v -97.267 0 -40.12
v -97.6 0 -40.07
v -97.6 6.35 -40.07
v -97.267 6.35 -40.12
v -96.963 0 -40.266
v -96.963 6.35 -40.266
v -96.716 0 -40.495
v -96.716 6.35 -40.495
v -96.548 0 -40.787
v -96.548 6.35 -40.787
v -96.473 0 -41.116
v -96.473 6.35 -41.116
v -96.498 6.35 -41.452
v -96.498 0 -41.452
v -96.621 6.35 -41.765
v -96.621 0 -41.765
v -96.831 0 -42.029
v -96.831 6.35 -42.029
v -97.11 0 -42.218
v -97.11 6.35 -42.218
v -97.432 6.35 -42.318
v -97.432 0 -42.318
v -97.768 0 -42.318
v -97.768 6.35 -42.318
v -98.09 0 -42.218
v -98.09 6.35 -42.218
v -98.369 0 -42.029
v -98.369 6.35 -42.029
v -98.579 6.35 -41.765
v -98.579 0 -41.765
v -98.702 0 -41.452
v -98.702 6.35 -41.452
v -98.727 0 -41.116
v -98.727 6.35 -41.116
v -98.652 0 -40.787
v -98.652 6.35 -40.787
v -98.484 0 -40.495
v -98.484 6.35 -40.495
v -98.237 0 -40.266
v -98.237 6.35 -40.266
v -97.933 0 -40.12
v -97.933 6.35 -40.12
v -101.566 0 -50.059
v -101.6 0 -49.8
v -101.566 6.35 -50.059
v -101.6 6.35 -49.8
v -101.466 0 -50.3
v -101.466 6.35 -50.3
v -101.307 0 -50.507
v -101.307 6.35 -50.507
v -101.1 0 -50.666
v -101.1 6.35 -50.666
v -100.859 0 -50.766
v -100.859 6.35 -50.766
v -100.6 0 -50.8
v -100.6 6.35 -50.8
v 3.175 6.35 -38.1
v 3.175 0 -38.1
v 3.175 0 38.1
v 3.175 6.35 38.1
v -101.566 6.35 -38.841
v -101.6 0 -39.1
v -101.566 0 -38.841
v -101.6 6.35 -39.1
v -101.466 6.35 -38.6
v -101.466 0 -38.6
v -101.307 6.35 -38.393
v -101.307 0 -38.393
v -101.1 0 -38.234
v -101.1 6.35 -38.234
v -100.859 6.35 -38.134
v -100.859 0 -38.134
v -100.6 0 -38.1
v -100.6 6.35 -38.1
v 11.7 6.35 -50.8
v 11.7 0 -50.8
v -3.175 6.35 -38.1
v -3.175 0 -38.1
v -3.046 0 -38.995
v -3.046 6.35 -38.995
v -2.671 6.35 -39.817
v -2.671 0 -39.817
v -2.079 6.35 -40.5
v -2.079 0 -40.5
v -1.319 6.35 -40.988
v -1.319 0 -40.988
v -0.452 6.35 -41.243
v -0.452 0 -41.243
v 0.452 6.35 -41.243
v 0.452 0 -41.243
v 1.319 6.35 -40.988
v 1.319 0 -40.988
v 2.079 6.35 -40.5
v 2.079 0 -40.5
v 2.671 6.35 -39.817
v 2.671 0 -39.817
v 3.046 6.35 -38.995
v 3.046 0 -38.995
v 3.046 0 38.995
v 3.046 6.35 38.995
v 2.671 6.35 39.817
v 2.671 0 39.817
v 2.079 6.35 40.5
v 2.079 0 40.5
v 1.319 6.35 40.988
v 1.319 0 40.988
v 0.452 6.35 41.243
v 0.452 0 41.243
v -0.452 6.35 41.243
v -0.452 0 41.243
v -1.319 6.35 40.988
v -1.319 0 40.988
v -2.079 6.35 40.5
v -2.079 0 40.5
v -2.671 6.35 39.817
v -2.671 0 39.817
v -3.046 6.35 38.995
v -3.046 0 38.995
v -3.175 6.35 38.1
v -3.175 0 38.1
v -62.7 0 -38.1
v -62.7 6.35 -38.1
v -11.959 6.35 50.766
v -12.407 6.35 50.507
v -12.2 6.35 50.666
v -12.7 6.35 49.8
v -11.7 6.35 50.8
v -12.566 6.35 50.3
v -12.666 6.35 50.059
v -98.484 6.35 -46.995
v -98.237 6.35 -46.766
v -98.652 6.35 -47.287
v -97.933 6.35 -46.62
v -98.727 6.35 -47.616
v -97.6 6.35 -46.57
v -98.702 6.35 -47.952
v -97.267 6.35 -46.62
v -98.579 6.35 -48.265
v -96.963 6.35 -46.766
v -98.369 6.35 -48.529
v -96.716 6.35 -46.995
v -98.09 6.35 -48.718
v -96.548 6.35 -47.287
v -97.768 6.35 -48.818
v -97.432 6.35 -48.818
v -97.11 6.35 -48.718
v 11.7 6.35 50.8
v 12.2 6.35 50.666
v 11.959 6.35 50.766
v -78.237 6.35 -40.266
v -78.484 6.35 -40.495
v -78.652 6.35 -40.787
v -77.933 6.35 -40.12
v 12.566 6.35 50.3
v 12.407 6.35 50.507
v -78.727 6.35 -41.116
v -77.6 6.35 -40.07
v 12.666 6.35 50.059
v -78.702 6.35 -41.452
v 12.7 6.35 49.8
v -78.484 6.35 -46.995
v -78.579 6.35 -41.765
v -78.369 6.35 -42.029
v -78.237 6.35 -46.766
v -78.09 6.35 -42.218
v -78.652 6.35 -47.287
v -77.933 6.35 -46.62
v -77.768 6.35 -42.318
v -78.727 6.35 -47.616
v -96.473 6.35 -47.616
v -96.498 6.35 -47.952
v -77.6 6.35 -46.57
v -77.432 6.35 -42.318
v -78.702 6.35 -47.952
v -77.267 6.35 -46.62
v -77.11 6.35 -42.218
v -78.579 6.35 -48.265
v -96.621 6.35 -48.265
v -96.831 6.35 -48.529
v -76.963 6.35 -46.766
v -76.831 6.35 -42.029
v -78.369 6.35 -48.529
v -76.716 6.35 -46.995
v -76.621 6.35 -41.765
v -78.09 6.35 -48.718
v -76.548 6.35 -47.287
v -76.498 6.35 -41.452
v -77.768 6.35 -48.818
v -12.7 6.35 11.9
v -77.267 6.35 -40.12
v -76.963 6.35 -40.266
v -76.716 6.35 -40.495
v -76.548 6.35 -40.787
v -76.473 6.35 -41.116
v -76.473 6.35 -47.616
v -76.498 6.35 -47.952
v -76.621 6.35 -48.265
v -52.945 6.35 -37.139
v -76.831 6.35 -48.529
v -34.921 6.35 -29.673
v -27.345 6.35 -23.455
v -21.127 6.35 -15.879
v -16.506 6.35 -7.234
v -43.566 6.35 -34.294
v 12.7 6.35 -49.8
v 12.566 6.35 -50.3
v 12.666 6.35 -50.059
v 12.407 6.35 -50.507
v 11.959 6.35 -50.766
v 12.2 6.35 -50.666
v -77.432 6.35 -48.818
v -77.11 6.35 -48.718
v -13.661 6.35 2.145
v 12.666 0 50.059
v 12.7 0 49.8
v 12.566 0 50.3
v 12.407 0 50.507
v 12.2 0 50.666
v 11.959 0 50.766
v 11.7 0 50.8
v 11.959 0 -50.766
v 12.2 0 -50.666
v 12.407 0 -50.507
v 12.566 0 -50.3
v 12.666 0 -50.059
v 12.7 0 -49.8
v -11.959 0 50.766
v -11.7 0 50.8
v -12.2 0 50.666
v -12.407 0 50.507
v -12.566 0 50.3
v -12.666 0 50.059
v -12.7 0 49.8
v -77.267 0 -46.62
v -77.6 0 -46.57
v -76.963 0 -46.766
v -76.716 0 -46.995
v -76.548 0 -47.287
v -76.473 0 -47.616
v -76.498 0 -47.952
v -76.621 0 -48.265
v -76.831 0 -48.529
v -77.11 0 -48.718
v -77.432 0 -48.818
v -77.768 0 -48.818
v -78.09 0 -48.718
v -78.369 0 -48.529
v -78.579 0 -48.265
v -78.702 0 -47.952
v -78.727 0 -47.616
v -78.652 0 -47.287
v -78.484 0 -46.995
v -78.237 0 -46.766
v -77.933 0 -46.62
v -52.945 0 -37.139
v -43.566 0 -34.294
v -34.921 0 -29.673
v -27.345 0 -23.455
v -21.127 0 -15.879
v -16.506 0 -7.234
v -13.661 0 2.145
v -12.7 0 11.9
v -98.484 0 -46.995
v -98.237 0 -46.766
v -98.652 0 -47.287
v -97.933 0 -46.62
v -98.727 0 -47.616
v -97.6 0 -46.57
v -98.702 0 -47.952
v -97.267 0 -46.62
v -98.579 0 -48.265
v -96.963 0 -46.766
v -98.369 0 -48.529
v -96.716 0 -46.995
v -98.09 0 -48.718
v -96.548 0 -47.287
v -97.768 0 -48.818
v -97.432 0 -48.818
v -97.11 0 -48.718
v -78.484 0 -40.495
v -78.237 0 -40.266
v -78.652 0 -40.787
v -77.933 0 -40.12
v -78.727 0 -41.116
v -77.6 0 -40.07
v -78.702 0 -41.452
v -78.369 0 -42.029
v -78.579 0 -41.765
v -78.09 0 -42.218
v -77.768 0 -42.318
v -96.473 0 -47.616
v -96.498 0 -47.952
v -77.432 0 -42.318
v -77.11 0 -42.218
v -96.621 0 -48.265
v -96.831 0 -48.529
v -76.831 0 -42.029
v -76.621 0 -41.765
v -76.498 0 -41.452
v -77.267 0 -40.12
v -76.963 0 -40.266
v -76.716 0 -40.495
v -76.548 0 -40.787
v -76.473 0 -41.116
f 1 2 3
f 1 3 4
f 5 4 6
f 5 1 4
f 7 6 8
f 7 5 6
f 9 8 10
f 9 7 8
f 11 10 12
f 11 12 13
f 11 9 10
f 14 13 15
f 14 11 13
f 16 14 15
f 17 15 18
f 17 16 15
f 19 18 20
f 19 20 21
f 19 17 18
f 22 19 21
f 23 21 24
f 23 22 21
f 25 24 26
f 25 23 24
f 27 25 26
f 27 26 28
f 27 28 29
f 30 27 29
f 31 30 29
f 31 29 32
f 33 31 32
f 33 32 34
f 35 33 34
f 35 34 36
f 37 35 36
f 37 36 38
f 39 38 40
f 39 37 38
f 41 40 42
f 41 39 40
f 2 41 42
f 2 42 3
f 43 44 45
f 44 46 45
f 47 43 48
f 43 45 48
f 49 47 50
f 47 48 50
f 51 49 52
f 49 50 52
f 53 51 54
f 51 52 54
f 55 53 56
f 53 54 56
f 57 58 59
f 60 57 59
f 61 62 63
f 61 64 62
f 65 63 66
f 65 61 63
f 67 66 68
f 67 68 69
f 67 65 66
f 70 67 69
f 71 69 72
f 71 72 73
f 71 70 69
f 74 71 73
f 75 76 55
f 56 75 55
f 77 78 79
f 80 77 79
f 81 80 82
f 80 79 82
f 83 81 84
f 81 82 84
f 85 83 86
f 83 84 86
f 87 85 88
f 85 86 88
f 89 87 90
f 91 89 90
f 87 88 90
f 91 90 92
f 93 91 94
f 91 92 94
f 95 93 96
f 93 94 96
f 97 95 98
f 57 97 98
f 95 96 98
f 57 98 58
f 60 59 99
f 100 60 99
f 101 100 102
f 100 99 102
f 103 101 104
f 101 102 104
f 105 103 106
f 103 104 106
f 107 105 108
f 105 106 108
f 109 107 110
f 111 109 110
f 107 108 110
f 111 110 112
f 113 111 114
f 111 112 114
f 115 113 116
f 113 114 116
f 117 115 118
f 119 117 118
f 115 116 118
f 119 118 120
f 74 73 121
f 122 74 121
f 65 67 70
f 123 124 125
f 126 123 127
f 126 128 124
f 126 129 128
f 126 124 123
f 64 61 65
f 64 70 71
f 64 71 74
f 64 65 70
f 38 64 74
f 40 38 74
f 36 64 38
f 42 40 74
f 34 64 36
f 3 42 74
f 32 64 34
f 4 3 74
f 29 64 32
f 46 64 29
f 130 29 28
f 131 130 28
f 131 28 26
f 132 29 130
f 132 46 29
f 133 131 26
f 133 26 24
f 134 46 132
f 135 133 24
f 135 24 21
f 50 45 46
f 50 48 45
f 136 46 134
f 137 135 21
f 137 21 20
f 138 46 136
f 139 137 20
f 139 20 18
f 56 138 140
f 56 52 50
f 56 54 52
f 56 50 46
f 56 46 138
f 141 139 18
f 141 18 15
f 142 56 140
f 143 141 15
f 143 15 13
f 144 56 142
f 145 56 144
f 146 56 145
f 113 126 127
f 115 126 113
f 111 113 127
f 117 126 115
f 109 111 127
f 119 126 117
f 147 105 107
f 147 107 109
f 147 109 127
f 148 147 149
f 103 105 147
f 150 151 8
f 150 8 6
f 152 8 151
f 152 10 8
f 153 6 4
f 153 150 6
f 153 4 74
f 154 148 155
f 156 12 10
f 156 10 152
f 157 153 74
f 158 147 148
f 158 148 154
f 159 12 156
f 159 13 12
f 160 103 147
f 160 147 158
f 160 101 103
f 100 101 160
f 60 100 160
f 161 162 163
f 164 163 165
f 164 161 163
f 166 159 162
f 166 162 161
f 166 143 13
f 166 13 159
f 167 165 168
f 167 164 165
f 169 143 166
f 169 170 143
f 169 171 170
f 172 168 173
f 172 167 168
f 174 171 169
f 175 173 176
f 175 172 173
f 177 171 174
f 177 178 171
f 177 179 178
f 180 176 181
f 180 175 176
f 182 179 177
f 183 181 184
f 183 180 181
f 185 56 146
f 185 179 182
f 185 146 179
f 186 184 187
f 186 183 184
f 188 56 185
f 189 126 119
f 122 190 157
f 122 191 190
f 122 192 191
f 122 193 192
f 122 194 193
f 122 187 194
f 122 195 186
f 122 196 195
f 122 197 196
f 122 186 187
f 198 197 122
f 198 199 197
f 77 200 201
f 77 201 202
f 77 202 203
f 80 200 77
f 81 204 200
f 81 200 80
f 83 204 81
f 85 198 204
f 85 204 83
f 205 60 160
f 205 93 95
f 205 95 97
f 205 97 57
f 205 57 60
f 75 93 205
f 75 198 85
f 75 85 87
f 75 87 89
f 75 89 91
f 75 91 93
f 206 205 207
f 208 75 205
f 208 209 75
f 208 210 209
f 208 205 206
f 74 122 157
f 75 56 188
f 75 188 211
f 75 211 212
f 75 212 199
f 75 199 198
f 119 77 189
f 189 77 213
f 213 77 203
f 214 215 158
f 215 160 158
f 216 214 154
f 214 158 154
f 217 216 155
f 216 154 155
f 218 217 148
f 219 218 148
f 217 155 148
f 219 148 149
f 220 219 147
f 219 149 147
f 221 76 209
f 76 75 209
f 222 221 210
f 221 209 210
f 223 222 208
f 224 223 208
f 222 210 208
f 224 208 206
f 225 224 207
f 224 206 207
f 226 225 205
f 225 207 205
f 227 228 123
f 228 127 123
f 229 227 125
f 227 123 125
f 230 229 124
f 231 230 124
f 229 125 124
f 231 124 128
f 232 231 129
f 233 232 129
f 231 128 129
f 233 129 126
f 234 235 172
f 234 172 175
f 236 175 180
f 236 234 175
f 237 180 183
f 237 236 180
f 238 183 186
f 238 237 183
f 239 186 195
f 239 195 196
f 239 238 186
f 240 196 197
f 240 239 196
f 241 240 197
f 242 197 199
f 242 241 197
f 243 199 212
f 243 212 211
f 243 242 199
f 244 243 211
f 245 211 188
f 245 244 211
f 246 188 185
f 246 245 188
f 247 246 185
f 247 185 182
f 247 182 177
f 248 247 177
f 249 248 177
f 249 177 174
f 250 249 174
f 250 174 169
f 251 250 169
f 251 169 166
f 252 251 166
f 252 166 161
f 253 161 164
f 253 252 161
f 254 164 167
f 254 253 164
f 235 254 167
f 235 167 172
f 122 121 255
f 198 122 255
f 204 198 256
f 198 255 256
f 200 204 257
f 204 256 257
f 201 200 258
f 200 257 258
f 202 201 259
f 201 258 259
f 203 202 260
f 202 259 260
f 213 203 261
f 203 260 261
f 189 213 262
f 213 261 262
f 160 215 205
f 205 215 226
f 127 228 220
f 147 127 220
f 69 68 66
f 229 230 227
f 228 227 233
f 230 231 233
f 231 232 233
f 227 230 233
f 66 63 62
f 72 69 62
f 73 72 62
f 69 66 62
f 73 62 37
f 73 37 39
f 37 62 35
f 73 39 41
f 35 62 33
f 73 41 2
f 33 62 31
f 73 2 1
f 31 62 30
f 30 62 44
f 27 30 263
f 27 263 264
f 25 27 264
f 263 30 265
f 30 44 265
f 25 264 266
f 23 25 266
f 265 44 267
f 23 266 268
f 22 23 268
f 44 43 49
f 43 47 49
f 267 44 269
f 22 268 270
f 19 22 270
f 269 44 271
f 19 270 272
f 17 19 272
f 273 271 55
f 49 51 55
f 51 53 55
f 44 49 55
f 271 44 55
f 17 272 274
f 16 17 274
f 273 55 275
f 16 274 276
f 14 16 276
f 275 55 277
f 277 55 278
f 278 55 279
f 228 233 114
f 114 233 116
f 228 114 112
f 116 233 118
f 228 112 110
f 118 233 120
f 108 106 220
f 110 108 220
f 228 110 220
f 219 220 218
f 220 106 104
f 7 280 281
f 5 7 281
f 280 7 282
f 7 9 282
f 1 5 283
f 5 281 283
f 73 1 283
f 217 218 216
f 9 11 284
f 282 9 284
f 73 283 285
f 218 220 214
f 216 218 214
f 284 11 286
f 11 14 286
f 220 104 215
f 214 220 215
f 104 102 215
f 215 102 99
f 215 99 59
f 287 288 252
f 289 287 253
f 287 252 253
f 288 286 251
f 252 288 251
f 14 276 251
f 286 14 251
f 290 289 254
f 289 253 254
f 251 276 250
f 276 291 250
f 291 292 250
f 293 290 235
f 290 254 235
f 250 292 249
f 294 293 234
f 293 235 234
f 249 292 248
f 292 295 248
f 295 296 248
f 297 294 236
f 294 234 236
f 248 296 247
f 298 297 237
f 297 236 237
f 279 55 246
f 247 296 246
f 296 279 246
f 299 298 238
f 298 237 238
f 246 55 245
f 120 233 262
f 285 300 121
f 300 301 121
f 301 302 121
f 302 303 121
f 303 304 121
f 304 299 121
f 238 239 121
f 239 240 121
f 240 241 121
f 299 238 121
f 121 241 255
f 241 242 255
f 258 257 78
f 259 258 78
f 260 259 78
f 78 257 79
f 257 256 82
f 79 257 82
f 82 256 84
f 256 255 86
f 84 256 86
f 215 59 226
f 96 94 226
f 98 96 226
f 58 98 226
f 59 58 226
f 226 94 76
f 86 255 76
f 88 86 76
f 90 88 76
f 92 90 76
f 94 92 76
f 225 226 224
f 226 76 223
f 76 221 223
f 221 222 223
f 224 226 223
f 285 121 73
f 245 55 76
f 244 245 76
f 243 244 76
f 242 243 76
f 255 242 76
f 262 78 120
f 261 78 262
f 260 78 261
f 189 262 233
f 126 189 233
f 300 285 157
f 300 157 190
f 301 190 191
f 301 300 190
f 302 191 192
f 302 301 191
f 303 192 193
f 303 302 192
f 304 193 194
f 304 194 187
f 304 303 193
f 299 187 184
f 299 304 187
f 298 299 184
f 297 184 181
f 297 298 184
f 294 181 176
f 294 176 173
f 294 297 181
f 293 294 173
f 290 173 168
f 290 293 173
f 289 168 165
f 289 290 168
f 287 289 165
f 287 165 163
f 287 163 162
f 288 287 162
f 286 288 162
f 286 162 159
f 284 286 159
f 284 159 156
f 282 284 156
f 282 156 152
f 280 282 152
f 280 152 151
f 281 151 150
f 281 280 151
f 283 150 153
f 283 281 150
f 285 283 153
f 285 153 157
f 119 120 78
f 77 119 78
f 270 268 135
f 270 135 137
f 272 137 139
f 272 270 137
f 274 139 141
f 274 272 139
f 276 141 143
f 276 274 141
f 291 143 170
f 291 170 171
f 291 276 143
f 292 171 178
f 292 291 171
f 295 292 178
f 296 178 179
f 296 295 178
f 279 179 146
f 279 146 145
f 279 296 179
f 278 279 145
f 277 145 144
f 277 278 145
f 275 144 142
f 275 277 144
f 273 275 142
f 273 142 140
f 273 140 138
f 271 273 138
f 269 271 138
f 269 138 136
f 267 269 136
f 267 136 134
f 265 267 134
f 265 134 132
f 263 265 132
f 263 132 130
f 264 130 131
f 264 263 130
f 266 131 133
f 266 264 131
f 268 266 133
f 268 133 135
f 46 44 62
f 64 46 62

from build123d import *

# Parameters (mm, degrees)
SKETCH1_R           = 1.1303
BOSS_EXTRUDE2_DEPTH = 6.35
FILLET1_R           = 1


with BuildPart() as part:
    # Sketch1 → Boss-Extrude2 (new body)
    with BuildSketch(Plane(origin=(0, 0, 0), x_dir=(1, 0, 0), z_dir=(0, 1, 0))):
        with BuildLine():
            Line((-12.7, 50.8), (-101.6, 50.8))
            Line((-101.6, 50.8), (-101.6, 38.1))
            Line((-101.6, 38.1), (-62.7, 38.1))
            ThreePointArc((-62.7, 38.1), (-27.344660941, 23.455339059), (-12.7, -11.9))
            Line((-12.7, -11.9), (-12.7, -50.8))
            Line((-12.7, -50.8), (12.7, -50.8))
            Line((12.7, -50.8), (12.7, 50.8))
            Line((12.7, 50.8), (-12.7, 50.8))
        make_face()
        with Locations(Location((-97.6, 47.7, 0), (0, 0, 270))):
            Circle(SKETCH1_R, mode=Mode.SUBTRACT)
        with Locations(Location((-97.6, 41.2, 0), (0, 0, 270))):
            Circle(SKETCH1_R, mode=Mode.SUBTRACT)
        with Locations(Location((-77.6, 47.7, 0), (0, 0, 270))):
            Circle(SKETCH1_R, mode=Mode.SUBTRACT)
        with Locations(Location((-77.6, 41.2, 0), (0, 0, 270))):
            Circle(SKETCH1_R, mode=Mode.SUBTRACT)
        with BuildLine():
            Line((-3.175, -38.1), (-3.175, 38.1))
            ThreePointArc((-3.175, 38.1), (0, 41.275), (3.175, 38.1))
            Line((3.175, 38.1), (3.175, -38.1))
            ThreePointArc((3.175, -38.1), (0, -41.275), (-3.175, -38.1))
        make_face(mode=Mode.SUBTRACT)
    extrude(amount=BOSS_EXTRUDE2_DEPTH)

    # Fillet1
    fillet1_edges = [part.edges().sort_by_distance(p)[0] for p in [
        (12.7, 3.175, 50.8),
        (-12.7, 3.175, 50.8),
        (-101.6, 3.175, -38.1),
        (-101.6, 3.175, -50.8),
        (12.7, 3.175, -50.8),
    ]]
    fillet(fillet1_edges, radius=FILLET1_R)


solid = part.part
